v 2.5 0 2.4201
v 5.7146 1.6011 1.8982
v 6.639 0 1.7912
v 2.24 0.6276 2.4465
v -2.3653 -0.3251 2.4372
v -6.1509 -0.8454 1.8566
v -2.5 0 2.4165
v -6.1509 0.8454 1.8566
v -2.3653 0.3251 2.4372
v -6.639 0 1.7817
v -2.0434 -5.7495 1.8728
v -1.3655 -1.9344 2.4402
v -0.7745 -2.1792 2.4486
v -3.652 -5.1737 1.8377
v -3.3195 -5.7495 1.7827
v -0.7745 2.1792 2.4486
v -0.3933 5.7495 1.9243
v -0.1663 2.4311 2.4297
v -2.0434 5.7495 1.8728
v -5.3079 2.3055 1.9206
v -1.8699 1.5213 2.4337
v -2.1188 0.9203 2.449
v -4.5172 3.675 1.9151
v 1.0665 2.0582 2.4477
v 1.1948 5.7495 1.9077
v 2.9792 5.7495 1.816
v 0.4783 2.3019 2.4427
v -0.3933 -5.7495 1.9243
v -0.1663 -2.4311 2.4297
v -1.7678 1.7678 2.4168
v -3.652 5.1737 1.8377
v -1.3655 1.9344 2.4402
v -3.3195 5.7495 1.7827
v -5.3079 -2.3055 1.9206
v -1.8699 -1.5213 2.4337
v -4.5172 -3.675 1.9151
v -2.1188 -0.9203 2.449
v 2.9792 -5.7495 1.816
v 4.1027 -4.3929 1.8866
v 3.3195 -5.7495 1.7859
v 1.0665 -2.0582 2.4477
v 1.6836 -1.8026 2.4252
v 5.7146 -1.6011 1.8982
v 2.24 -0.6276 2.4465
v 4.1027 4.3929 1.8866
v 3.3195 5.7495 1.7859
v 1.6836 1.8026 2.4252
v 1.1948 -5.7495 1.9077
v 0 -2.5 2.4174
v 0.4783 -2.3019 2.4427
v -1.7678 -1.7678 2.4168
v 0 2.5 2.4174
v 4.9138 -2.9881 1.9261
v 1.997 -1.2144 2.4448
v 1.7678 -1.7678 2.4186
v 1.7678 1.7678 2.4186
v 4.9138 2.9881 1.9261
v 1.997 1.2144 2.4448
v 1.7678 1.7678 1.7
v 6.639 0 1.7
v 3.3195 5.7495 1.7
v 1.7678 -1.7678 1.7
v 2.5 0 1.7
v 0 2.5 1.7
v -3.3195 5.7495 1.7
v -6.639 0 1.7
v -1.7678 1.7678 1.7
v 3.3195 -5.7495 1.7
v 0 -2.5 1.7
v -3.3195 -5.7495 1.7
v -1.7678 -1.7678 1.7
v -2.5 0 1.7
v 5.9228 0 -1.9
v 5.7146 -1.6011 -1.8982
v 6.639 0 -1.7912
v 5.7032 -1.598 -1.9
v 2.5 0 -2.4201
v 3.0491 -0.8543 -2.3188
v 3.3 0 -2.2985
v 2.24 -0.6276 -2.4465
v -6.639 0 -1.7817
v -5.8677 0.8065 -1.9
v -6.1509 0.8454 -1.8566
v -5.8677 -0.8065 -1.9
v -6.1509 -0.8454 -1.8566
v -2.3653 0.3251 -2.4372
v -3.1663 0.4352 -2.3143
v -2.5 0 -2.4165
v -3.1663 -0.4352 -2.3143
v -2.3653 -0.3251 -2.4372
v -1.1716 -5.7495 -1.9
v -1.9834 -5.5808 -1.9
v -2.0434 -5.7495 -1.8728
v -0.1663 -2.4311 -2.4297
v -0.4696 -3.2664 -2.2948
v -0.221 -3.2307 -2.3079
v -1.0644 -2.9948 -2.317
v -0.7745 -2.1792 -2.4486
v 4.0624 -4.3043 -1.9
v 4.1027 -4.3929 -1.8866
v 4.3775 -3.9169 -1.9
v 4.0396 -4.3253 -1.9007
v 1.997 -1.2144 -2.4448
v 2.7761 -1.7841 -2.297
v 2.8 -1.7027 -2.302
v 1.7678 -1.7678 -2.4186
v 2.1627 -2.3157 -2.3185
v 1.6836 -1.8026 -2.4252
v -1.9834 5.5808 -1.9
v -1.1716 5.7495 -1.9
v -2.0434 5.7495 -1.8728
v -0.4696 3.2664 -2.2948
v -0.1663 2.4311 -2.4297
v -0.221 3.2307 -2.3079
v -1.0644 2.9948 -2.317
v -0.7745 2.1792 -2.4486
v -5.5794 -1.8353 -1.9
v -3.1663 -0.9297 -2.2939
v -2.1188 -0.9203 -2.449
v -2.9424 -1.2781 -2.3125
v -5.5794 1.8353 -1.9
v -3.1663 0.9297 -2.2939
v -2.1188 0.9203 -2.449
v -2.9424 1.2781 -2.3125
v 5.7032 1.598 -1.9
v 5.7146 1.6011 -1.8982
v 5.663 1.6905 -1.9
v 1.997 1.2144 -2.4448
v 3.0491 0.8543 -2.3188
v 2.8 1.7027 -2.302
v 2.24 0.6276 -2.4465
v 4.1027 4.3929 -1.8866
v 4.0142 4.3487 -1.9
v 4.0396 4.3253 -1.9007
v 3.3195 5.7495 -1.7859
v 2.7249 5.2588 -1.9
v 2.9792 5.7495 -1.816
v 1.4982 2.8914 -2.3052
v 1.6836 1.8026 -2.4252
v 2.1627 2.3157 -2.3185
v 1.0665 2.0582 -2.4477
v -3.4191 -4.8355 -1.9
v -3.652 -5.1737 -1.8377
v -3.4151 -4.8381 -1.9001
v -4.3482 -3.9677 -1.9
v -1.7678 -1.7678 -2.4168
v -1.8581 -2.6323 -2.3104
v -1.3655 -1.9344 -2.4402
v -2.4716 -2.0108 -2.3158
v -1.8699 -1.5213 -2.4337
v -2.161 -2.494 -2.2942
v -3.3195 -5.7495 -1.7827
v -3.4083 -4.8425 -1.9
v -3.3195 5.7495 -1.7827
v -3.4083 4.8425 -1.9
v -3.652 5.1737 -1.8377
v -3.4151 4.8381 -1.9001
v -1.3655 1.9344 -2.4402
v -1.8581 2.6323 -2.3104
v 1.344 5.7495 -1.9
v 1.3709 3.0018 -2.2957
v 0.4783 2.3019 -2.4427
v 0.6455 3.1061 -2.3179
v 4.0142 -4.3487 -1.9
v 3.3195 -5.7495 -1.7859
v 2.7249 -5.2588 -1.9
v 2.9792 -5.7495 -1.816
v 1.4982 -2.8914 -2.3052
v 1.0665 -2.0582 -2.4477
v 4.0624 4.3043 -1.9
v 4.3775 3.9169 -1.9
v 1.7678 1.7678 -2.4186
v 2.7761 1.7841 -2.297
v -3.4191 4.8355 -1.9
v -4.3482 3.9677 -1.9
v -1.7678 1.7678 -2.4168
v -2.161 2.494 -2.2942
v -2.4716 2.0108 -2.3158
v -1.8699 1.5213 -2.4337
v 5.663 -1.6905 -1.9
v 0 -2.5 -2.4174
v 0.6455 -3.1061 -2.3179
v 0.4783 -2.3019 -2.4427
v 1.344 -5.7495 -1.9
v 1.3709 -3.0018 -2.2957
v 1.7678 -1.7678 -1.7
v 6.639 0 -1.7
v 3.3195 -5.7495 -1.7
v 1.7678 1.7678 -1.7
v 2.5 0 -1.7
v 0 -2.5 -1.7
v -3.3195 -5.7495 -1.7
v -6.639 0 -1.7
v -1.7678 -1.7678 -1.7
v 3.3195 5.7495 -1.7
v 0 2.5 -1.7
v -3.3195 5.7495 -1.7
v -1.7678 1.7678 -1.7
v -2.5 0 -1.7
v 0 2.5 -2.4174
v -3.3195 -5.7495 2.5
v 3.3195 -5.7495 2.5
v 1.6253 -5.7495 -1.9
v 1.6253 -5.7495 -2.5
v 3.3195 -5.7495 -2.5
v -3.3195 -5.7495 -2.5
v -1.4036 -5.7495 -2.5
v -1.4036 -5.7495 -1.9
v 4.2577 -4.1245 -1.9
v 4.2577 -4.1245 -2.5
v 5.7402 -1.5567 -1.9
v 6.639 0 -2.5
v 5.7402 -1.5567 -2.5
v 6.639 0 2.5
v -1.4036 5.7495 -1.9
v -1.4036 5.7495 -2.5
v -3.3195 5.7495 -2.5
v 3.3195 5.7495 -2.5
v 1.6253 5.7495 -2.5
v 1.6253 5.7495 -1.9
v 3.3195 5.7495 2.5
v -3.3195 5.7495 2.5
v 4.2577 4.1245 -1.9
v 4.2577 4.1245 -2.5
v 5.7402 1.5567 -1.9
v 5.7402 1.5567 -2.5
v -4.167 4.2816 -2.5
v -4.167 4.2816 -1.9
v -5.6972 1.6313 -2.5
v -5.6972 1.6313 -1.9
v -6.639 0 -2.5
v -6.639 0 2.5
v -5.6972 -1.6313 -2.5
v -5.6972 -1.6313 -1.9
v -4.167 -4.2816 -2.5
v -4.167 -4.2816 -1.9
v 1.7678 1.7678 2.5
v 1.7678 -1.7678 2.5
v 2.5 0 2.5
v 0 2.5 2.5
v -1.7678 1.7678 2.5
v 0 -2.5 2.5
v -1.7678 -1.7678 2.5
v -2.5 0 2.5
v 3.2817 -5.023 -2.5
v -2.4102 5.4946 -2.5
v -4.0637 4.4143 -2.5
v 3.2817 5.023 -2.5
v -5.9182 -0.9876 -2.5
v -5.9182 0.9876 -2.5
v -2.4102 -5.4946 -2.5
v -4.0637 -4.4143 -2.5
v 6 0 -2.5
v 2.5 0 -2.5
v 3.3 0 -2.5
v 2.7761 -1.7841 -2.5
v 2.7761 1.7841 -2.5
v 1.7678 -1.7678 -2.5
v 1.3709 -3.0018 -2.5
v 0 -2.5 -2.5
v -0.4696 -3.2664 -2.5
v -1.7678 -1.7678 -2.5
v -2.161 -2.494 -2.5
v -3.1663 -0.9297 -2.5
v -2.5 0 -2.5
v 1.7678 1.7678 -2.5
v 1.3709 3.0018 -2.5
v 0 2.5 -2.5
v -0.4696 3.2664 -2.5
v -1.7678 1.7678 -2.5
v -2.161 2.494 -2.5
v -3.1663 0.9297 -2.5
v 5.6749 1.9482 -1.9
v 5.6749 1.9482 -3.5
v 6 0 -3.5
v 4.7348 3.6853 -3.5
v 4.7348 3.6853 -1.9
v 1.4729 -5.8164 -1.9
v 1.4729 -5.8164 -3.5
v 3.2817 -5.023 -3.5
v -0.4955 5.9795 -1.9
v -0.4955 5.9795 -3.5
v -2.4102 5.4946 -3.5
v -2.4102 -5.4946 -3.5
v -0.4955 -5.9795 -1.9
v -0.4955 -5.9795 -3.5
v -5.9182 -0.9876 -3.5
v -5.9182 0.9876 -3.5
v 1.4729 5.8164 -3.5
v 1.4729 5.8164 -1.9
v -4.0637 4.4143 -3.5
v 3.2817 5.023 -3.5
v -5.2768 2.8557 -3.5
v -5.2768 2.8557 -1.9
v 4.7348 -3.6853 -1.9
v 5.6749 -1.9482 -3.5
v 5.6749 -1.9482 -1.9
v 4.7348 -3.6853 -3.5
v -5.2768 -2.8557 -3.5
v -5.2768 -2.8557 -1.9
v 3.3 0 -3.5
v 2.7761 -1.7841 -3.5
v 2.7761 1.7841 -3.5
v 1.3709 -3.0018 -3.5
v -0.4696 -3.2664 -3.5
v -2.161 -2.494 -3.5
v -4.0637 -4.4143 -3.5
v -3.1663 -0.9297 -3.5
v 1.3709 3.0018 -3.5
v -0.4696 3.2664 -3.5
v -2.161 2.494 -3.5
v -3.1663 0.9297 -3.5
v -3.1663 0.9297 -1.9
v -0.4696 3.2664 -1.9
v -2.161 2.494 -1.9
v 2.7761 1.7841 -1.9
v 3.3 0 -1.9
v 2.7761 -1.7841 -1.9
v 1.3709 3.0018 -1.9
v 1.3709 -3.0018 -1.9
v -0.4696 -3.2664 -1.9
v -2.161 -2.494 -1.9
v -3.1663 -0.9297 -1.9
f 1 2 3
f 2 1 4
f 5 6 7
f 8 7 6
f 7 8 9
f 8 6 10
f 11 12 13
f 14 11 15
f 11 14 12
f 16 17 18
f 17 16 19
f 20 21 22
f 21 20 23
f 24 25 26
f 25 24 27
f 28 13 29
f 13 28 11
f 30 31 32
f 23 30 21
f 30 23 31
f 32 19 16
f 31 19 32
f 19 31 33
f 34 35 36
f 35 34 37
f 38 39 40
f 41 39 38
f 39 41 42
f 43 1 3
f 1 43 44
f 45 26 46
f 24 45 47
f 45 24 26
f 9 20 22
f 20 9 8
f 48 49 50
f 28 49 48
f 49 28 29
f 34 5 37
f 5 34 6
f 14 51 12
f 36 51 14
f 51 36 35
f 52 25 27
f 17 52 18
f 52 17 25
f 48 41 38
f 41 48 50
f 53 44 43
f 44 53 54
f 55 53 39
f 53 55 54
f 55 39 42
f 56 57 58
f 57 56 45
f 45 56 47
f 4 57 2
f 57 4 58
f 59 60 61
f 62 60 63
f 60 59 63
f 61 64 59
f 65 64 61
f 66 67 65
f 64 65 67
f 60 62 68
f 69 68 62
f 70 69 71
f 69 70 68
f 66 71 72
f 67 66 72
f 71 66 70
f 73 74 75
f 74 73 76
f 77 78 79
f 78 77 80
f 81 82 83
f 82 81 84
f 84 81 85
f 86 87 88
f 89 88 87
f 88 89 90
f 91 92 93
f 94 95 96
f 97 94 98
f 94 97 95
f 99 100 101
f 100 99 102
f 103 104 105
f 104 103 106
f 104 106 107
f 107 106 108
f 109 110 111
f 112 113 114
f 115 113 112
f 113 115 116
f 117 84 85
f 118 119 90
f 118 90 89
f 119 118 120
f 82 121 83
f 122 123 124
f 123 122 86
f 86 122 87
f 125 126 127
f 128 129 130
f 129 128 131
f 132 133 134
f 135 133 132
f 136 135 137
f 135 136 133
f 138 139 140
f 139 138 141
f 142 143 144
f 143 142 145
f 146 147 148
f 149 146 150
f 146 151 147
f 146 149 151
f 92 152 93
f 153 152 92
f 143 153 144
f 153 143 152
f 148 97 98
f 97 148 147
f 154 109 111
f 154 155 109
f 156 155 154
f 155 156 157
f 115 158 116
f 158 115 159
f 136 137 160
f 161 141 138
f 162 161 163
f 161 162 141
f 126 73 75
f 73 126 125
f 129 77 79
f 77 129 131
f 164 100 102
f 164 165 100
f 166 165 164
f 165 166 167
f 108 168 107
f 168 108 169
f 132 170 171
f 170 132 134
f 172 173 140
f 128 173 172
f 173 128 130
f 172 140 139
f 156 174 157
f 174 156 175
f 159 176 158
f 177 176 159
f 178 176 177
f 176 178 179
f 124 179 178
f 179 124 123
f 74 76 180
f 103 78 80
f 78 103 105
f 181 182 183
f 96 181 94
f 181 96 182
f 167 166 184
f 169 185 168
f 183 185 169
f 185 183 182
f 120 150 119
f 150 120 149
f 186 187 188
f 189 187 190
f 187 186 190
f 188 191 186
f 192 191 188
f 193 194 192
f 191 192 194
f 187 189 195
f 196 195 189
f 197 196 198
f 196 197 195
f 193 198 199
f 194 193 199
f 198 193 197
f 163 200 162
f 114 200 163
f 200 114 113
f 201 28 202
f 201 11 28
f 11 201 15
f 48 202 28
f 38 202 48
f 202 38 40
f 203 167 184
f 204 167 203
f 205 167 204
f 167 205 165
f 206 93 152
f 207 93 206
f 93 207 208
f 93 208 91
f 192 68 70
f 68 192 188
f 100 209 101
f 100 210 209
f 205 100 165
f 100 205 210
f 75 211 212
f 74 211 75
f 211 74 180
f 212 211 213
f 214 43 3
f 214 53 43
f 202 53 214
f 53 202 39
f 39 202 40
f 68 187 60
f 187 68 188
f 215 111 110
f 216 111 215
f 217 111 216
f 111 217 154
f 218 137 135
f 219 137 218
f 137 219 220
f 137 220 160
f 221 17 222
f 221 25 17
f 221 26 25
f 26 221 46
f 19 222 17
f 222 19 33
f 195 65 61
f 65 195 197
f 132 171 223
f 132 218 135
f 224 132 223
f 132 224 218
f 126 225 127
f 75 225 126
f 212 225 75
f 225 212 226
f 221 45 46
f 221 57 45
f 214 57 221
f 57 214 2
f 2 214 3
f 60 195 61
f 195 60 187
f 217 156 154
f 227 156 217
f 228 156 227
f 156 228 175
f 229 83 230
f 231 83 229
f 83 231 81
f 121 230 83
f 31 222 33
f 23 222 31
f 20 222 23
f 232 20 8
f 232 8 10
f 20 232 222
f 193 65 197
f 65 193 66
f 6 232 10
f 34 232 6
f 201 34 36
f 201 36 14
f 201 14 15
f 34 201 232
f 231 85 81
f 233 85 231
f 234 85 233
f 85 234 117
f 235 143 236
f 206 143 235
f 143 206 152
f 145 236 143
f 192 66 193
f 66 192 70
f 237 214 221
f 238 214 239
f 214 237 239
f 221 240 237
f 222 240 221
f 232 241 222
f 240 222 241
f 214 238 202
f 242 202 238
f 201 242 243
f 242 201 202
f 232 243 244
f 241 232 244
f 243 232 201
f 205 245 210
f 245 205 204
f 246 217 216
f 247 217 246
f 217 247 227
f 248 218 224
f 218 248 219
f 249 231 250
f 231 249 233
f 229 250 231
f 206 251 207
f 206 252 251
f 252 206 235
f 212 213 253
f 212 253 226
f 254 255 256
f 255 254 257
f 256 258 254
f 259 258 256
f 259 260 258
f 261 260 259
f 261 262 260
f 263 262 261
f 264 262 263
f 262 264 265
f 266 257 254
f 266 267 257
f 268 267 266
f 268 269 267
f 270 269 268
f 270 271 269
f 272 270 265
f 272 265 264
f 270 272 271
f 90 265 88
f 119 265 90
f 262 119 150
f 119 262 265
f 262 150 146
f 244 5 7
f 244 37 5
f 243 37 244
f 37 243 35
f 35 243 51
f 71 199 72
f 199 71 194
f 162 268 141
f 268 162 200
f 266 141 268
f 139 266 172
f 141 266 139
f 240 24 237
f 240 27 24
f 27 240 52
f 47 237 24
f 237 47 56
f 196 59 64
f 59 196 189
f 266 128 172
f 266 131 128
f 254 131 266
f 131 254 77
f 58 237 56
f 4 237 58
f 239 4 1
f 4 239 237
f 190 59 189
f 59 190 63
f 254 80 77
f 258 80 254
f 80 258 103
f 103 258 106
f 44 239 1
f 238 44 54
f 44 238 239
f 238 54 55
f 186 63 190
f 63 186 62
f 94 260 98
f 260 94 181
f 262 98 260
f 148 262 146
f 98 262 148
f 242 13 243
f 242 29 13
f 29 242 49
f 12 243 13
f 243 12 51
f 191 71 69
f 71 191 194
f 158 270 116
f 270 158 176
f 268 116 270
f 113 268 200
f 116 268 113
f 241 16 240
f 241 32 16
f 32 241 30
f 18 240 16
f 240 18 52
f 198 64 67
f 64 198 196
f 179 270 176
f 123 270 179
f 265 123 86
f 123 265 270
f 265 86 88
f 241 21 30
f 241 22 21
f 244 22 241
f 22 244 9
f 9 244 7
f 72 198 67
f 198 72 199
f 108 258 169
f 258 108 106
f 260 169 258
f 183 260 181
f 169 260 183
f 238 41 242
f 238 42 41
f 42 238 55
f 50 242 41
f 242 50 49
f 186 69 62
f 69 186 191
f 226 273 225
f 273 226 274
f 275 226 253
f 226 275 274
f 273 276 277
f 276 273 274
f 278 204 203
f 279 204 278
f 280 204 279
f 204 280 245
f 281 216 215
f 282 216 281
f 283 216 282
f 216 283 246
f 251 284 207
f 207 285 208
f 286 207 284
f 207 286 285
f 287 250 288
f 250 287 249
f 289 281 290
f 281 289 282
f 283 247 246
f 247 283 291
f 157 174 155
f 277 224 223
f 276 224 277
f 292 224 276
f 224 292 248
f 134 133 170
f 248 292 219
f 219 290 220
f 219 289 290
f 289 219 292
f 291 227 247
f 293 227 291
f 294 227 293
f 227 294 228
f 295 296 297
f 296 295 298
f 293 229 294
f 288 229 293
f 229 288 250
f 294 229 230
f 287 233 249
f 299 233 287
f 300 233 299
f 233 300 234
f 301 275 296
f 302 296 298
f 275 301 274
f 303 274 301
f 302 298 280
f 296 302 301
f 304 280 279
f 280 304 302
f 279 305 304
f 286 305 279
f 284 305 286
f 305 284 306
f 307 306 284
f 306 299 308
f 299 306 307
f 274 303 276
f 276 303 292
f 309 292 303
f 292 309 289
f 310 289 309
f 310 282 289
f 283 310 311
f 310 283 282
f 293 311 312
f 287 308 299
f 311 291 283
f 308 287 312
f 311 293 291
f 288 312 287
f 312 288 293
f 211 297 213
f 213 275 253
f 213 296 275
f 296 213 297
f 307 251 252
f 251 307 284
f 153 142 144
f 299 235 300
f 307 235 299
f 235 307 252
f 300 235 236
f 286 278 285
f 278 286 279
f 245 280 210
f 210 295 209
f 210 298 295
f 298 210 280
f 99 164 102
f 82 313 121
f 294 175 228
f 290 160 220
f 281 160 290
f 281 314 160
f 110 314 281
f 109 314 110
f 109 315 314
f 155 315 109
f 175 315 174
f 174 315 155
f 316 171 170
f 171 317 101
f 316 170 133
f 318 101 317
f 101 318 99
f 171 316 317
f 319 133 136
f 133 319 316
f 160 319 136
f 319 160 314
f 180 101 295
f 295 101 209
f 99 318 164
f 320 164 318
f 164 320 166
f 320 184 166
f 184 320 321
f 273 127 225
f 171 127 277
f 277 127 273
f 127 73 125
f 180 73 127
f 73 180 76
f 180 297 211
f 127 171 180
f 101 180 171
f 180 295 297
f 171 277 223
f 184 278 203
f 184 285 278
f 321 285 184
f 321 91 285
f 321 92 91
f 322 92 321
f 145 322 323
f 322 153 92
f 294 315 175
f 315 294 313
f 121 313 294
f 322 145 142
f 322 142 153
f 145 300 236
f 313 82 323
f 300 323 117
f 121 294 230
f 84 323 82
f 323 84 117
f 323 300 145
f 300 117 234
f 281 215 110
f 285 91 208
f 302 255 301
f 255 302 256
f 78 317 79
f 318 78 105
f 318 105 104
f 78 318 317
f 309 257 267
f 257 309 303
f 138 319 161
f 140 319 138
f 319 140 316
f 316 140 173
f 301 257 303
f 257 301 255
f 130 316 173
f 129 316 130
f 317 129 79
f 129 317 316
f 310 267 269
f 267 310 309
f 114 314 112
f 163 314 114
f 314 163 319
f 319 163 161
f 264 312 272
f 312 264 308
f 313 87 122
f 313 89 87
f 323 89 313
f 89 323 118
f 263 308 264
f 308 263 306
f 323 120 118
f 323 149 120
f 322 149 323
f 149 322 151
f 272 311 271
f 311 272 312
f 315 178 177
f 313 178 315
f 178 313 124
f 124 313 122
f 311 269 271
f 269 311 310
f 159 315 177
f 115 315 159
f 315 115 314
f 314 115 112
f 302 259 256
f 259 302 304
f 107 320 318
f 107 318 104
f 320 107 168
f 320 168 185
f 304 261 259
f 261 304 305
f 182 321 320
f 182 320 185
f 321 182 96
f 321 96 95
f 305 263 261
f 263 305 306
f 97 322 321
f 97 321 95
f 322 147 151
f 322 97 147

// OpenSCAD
// Parameters
thread_nominal_diameter_mm = 6; //[3:12:0.1]
thread_pitch_mm = 1; //[0.5:2:0.1]
hole_type = 1; //[0:1:1]
across_flats_mm = 11.5; //[6:23:0.1]
thickness_mm = 5; //[2.5:10:0.1]
chamfer_mm = 0.5; //[0.2:1.5:0.1]
eps_mm = 0.6; //[0.2:1.5:0.1]
hex_circumradius_mm = 6.639; //[3.3:13.3:0.001]
threaded_hole_diameter_mm = 5; //[4:6:0.1]
clearance_hole_diameter_mm = 6.6; //[6.2:7.2:0.1]
washer_outer_diameter_mm = 12; //[8:24:0.1]
washer_thickness_mm = 1.6; //[0.8:3.2:0.1]
washer_hole_diameter_mm = 6.6; //[6.2:7.2:0.1]

// Nut and Washer - complete geometry
module nut_and_washer() {
  color("DimGray") {
    // Hex Nut Body
    difference() {
      cylinder(r=hex_circumradius_mm, h=thickness_mm, center=true, $fn=6);
      // Top and Bottom Chamfers
      union() {
        translate([0, 0, thickness_mm/2 - chamfer_mm/2])
          cylinder(r1=hex_circumradius_mm + eps_mm, r2=0, h=chamfer_mm + eps_mm, center=true);
        translate([0, 0, -thickness_mm/2 + chamfer_mm/2])
          rotate([180, 0, 0])
          cylinder(r1=hex_circumradius_mm + eps_mm, r2=0, h=chamfer_mm + eps_mm, center=true);
      }
      // Central Thread Hole
      cylinder(r=((hole_type*threaded_hole_diameter_mm + (1-hole_type)*clearance_hole_diameter_mm)/2), 
               h=thickness_mm + 2*eps_mm, center=true);
    }
  }
  
  color("Silver") {
    // Washer
    difference() {
      translate([0, 0, -thickness_mm/2 - washer_thickness_mm/2 + eps_mm])
        cylinder(r=washer_outer_diameter_mm/2, h=washer_thickness_mm, center=true);
      translate([0, 0, -thickness_mm/2 - washer_thickness_mm/2 + eps_mm])
        cylinder(r=washer_hole_diameter_mm/2, h=washer_thickness_mm + 2*eps_mm, center=true);
    }
  }
}

// Assembly
module assembly() {
  nut_and_washer();
}

assembly();
